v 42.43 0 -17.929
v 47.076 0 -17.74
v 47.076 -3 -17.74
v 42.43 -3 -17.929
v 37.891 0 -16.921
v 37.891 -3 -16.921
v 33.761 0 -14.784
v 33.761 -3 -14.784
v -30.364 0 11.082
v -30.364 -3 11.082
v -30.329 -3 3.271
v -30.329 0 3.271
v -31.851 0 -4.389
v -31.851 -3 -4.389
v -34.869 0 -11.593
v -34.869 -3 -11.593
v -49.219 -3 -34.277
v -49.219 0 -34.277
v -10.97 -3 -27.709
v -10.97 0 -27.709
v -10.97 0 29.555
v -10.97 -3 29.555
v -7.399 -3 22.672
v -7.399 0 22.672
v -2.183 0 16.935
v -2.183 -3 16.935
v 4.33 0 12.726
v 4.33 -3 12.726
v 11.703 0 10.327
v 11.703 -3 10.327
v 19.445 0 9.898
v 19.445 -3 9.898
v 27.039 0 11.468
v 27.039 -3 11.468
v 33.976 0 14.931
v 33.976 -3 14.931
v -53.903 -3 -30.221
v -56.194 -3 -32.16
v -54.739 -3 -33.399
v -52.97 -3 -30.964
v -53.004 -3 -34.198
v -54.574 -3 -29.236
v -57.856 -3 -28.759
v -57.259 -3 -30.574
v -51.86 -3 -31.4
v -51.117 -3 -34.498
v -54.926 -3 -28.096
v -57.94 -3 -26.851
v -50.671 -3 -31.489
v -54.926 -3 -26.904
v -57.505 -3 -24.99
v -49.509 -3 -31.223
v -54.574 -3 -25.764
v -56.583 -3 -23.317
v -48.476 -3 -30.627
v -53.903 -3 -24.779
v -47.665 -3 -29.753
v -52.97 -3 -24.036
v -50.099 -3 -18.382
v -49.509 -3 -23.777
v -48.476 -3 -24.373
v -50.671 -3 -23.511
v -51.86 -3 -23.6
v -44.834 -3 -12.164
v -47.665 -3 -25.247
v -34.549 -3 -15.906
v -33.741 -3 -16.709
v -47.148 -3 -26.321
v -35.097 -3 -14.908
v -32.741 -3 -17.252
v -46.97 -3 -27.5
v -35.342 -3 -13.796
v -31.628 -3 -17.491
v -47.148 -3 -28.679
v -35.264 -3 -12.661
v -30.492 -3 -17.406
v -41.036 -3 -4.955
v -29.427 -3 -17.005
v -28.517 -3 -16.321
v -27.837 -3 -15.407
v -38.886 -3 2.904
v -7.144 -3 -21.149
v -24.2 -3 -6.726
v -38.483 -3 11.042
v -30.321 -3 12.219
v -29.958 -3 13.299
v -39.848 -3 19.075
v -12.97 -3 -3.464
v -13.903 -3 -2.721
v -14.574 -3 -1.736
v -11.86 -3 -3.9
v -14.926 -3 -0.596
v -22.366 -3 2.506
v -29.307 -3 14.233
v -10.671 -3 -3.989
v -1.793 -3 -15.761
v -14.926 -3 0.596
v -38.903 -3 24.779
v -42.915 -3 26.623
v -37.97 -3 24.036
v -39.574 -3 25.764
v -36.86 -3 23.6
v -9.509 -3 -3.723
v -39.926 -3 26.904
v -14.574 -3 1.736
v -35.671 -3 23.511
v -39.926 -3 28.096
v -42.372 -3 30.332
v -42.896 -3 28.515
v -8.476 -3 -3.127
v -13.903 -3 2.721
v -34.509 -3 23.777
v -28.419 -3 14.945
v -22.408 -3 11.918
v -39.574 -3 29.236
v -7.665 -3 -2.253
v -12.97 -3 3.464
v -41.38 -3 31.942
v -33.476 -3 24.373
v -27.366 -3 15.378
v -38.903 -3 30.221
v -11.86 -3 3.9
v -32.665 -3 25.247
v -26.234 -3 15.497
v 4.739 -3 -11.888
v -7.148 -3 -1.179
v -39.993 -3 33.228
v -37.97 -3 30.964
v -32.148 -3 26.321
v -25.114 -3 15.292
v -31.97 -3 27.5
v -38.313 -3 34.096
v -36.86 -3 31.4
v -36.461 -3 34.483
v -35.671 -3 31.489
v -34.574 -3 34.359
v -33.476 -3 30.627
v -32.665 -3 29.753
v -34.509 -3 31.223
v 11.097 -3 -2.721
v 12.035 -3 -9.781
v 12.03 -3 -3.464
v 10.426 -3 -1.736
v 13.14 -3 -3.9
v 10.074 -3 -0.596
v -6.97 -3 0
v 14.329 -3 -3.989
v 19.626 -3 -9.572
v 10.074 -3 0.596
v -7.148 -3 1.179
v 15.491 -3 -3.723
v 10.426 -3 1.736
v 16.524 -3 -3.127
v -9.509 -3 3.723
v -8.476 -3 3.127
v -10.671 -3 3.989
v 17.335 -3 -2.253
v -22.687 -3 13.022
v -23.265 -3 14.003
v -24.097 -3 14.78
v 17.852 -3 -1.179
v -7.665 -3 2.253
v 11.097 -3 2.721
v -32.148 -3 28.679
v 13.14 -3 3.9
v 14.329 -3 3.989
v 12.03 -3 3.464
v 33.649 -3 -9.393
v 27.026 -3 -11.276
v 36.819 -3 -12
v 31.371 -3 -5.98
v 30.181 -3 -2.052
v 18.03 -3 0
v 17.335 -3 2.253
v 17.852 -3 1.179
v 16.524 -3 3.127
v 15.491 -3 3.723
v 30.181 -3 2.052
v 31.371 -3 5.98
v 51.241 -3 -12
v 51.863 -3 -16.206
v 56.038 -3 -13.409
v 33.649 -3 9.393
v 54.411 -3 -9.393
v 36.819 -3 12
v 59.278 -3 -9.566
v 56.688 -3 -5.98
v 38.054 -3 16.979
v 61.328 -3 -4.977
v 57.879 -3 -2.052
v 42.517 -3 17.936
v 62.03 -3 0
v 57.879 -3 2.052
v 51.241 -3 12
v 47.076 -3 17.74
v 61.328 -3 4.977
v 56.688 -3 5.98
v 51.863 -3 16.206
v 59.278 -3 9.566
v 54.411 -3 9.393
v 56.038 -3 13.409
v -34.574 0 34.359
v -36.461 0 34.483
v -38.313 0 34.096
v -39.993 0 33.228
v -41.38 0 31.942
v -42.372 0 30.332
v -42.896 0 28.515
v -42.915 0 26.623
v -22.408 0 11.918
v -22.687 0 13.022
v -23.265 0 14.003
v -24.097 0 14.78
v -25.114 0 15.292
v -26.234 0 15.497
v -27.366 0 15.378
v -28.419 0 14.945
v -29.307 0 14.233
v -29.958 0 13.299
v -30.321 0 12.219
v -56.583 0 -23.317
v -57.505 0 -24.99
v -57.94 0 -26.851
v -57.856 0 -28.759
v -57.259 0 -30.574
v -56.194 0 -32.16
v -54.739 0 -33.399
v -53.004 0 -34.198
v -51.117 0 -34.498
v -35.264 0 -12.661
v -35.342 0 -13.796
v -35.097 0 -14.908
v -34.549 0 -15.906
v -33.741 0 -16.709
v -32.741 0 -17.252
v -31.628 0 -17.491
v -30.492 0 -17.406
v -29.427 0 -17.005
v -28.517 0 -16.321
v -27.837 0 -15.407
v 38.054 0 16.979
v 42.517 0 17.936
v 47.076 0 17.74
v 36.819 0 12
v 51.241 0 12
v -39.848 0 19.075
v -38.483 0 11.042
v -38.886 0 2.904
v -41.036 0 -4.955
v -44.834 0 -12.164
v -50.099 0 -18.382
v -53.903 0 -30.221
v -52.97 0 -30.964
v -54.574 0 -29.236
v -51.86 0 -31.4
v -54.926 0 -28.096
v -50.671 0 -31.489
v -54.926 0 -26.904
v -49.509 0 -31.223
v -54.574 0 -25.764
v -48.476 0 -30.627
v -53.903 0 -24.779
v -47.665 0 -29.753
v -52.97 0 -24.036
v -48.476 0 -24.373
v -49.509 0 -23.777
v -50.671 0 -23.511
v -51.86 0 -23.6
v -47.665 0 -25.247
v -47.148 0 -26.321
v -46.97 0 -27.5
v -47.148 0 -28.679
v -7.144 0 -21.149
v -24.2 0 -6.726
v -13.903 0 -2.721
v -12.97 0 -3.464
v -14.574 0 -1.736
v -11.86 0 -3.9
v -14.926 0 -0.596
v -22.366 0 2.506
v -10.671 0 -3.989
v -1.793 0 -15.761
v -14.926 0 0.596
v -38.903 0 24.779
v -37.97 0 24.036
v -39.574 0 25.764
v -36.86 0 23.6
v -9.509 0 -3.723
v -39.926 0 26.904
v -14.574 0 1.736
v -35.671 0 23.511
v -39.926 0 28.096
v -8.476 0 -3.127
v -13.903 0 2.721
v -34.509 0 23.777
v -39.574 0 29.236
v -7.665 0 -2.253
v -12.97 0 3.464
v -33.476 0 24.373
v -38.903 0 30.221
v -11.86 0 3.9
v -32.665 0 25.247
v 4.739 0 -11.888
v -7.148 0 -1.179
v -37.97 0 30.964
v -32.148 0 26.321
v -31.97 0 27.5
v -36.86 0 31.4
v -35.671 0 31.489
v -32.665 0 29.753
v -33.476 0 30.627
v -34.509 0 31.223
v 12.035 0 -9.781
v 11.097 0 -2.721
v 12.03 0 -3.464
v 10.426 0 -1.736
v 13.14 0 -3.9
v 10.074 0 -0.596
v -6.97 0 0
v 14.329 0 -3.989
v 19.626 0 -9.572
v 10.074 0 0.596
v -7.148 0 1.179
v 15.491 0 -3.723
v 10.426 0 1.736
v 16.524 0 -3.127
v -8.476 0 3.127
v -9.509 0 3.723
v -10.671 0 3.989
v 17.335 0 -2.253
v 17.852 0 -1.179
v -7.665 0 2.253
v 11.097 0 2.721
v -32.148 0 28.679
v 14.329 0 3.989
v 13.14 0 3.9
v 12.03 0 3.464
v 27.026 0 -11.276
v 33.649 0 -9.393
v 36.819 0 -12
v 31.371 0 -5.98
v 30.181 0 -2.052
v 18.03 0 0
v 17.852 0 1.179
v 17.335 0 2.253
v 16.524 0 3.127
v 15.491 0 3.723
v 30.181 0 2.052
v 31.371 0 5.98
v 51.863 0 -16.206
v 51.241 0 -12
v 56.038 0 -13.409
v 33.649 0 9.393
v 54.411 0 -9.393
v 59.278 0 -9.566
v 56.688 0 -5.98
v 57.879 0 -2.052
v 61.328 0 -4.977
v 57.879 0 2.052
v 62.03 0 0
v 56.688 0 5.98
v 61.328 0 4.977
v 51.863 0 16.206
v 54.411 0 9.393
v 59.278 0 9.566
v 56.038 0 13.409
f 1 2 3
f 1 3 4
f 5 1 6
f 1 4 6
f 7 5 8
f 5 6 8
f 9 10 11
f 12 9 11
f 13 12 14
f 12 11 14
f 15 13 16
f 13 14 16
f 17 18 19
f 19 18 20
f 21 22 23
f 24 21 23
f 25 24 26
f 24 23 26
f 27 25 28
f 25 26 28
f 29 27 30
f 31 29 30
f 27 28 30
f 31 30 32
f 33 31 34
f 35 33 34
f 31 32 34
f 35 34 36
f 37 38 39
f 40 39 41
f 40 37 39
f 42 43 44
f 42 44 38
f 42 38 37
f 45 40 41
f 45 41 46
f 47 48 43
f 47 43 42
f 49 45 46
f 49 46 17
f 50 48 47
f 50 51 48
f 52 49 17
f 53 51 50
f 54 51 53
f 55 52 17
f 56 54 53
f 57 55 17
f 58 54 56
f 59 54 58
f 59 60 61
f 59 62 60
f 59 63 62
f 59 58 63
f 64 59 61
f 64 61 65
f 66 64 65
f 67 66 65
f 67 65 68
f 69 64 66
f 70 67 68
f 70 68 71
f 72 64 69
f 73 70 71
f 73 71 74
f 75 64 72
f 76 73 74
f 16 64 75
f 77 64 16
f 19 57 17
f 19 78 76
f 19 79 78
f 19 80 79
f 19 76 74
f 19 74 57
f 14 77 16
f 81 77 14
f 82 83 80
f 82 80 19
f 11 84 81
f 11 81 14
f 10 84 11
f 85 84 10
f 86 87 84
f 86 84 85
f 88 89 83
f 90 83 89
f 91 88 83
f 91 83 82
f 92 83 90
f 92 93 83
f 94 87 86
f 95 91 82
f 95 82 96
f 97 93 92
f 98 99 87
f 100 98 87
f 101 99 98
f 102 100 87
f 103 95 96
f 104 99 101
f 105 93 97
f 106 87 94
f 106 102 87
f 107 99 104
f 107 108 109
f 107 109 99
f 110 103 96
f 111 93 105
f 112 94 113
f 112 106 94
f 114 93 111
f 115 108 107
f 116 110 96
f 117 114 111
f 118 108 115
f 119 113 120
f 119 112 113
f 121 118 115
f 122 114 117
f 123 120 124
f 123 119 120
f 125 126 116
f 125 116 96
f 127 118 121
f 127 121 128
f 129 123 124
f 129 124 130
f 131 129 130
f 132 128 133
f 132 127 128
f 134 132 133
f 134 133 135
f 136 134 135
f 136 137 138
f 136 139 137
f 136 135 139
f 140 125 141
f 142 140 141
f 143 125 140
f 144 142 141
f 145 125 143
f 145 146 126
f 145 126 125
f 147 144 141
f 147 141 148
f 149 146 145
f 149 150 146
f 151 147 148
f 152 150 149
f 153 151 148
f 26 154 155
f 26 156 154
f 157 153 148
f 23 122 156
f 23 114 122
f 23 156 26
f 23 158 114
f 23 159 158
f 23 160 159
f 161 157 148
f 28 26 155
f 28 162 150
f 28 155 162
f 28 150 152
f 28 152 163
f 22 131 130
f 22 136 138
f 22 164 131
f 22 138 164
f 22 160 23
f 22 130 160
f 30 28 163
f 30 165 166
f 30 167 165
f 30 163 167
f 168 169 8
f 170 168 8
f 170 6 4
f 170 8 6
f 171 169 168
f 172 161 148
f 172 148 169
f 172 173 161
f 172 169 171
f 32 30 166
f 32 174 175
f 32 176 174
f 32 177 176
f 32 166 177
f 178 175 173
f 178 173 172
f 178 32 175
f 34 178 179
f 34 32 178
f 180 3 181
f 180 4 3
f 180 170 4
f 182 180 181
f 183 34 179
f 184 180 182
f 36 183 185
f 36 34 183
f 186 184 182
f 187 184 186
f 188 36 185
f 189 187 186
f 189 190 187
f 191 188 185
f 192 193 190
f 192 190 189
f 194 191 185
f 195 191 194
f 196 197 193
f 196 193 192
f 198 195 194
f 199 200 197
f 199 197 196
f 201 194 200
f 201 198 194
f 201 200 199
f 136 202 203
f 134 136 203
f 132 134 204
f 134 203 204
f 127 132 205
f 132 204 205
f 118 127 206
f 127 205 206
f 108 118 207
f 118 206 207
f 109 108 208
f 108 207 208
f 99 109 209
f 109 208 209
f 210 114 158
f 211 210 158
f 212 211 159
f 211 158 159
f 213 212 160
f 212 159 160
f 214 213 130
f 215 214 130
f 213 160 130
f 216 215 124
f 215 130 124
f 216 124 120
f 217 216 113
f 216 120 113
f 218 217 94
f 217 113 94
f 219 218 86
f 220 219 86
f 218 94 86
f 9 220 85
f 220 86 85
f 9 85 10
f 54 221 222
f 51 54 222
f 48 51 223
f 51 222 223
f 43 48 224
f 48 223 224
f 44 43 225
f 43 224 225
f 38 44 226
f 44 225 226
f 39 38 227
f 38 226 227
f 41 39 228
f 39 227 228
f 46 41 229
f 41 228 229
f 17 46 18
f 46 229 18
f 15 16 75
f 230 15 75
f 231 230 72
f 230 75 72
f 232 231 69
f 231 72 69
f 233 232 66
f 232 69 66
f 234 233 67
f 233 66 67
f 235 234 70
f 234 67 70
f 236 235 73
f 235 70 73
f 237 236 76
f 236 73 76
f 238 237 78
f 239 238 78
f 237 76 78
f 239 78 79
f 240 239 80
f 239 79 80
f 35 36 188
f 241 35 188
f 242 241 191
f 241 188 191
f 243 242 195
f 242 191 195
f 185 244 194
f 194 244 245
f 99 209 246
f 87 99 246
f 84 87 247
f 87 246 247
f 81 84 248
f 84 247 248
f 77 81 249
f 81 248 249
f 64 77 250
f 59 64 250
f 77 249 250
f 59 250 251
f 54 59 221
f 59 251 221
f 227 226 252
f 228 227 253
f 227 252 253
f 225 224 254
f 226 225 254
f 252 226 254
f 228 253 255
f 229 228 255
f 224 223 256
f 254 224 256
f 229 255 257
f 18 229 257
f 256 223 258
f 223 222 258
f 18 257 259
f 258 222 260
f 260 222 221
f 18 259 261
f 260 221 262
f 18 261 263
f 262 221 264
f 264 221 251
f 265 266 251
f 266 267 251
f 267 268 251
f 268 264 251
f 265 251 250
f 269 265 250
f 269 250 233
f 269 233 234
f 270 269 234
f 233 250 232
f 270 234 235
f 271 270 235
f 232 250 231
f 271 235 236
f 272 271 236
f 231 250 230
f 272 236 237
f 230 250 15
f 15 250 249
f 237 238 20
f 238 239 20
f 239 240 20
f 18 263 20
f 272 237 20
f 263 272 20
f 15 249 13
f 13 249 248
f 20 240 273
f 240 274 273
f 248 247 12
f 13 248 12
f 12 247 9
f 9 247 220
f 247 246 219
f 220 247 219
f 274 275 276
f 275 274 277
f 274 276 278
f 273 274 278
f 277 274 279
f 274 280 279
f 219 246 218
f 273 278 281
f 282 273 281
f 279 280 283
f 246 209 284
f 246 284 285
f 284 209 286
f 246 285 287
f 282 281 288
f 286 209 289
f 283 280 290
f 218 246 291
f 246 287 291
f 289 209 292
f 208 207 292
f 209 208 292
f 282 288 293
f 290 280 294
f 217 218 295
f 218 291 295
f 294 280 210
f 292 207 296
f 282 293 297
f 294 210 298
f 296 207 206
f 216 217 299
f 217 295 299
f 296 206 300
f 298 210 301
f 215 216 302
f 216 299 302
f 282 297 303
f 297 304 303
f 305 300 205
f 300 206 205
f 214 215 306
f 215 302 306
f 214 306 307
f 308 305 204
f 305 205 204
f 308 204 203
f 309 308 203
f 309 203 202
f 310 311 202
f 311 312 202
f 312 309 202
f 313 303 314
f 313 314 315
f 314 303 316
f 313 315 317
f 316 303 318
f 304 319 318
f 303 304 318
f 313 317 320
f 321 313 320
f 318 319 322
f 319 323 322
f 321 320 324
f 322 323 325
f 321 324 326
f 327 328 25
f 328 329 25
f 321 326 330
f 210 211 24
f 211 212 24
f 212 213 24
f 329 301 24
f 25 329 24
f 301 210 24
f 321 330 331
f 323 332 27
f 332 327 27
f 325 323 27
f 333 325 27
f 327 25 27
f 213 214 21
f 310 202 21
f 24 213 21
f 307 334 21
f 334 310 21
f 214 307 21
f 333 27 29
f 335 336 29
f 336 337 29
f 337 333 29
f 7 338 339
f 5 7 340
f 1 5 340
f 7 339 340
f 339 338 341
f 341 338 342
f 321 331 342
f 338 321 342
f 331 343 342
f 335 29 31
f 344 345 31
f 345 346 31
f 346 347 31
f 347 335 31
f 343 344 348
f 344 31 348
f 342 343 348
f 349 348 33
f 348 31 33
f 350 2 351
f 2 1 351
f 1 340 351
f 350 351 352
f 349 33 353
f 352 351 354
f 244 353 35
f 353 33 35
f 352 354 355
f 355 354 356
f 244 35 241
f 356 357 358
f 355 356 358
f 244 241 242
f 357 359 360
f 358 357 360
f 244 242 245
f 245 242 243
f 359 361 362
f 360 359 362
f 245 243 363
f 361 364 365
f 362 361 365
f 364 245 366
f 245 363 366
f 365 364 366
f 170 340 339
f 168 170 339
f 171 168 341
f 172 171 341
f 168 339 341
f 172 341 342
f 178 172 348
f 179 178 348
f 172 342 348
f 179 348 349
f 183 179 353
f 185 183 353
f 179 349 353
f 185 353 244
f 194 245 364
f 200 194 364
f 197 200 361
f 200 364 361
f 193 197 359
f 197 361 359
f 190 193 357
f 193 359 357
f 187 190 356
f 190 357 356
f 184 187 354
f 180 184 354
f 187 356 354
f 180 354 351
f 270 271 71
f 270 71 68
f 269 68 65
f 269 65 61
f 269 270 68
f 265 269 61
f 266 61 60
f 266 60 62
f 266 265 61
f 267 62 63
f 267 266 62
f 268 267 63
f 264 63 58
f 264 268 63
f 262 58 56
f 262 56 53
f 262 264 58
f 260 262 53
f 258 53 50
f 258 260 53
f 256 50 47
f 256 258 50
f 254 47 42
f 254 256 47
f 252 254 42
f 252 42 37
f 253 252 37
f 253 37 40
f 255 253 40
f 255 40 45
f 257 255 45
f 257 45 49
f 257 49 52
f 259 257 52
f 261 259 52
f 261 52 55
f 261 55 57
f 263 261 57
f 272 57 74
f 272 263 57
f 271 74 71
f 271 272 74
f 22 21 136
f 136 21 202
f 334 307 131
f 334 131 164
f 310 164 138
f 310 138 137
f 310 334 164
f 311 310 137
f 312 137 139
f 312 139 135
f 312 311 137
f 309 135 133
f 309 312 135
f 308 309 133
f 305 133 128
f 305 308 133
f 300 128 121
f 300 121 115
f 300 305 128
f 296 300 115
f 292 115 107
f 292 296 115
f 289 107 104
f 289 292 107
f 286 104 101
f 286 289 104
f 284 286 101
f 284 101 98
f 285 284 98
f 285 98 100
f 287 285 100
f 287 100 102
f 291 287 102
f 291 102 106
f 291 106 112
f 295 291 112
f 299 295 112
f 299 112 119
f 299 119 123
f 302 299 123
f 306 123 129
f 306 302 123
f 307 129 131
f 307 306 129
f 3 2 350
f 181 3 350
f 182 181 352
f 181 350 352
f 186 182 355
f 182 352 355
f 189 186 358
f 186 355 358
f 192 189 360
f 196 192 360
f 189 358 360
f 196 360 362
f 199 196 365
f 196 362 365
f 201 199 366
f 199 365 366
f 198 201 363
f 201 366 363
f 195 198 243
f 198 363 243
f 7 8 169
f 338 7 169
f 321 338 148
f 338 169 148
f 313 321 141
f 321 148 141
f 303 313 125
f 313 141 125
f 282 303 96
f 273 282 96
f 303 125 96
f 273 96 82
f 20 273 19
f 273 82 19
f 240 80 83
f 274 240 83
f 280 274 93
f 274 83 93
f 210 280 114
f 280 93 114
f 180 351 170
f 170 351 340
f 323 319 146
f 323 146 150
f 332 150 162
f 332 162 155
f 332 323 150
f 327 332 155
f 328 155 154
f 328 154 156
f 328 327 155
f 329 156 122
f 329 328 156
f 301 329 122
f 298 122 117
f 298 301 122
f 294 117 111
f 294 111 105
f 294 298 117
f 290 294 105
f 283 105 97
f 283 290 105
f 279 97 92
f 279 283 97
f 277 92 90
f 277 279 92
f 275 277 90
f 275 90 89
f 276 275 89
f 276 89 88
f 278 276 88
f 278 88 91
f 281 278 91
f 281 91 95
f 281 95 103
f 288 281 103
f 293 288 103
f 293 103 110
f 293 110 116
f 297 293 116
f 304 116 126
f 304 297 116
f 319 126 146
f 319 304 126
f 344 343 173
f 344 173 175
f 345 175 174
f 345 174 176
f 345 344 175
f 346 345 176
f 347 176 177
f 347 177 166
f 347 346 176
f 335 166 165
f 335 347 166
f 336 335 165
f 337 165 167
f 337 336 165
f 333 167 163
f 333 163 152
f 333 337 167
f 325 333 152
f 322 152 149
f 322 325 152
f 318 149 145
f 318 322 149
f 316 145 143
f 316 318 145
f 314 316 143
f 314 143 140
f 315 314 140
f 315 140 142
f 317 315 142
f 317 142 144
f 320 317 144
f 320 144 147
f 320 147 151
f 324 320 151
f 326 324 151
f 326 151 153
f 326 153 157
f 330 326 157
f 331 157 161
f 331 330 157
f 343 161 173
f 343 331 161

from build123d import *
from build123d import SkipClean  # not in build123d's __all__

# Parameters (mm, degrees)
F0_R     = 4
F1_DEPTH = 3
F3_DEPTH = 25


# Not quite as in the source:
# - a feature names something its author has since deleted; it is built from what else it names


with BuildPart() as f1:
    # F0 (on Front) → F1 (new body)
    with BuildSketch(Plane.XZ):
        with BuildLine():
            Line((47.076298262, 17.7403006666), (-34.5741482174, 34.3593566285))
            ThreePointArc((-34.5741482174, 34.3593566285), (-40.7303881594, 32.6323986455), (-42.9151879903, 26.6233784428))
            ThreePointArc((-42.9151879903, 26.6233784428), (-39.7469745445, -1.0840101596), (-56.5827821886, -23.3167009679))
            ThreePointArc((-56.5827821886, -23.3167009679), (-56.7807033092, -31.4037364957), (-49.2188462892, -34.2773465607))
            Line((-49.2188462892, -34.2773465607), (47.076298262, -17.7403006666))
            ThreePointArc((47.076298262, -17.7403006666), (62.0297047119, 0), (47.076298262, 17.7403006666))
        make_face()
        with Locations((-50.9702952881, -27.5)):
            Circle(F0_R, mode=Mode.SUBTRACT)
        with Locations((-10.9702952881, 0)):
            Circle(F0_R, mode=Mode.SUBTRACT)
        with Locations((-35.9702952881, 27.5)):
            Circle(F0_R, mode=Mode.SUBTRACT)
        with Locations((14.0297047119, 0)):
            Circle(F0_R, mode=Mode.SUBTRACT)
        with BuildLine():
            ThreePointArc((36.818602161, -12), (30.0297047119, 0), (36.818602161, 12))
            Line((36.818602161, 12), (51.2408072628, 12))
            ThreePointArc((51.2408072628, 12), (58.0297047119, 0), (51.2408072628, -12))
            Line((51.2408072628, -12), (36.818602161, -12))
        make_face(mode=Mode.SUBTRACT)
    extrude(amount=F1_DEPTH)

    # F2 (on face) → F3 (cut)
    with BuildSketch(Plane.XZ.offset(3)):
        with BuildLine():
            ThreePointArc((33.9762752, 14.9307921776), (40.2551488392, 17.5997934068), (47.076298262, 17.7403006666))
            Line((47.076298262, 17.7403006666), (-10.9702952881, 29.555050349))
            ThreePointArc((-10.9702952881, 29.555050349), (7.9384350476, 11.2875267012), (33.9762752, 14.9307921776))
        make_face()
        with BuildLine():
            ThreePointArc((47.076298262, -17.7403006666), (40.1280392566, -17.572051863), (33.7614970255, -14.7839071598))
            ThreePointArc((33.7614970255, -14.7839071598), (8.3202088026, -10.6027369585), (-10.9702952881, -27.7088113948))
            Line((-10.9702952881, -27.7088113948), (47.076298262, -17.7403006666))
        make_face()
        with BuildLine():
            ThreePointArc((-30.363862552, 11.08172749), (-30.8978419926, -0.5969747066), (-34.8691691907, -11.5926911146))
            ThreePointArc((-34.8691691907, -11.5926911146), (-33.2604899055, -17.0159881706), (-27.8371928496, -15.4073088854))
            ThreePointArc((-27.8371928496, -15.4073088854), (-23.0512344312, -2.1560609065), (-22.4077207465, 11.91827251))
            ThreePointArc((-22.4077207465, 11.91827251), (-26.8040641592, 15.4780709028), (-30.363862552, 11.08172749))
        make_face()
    with SkipClean():  # cleaning this boolean's faces spoils the solid; the shape is the same uncleaned
        extrude(amount=-F3_DEPTH, mode=Mode.SUBTRACT)


solid = f1.part
